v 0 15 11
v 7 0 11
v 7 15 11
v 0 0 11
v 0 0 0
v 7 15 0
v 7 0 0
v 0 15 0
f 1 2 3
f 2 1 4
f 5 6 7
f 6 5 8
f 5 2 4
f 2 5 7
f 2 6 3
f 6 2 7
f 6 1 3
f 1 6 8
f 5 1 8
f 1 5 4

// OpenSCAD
// Generated by SolidPython 1.0.1 on 2020-07-29 00:46:55


cube(size = [7, 15, 11]);
/***********************************************
*********      SolidPython code:      **********
************************************************
 
# import packages: SolidPython
from solid import *
from solid.utils import *
from itertools import chain, combinations, permutations


class Resize:

    def __init__(self, scad_file):
        self.scad_file = scad_file
        #self.scad_file = import_scad(scad_file)
        # cone/cylinder param:
        self.r1 = 0
        self.r2 = 0
        self.h = 0
        # rectangular prism param:
        self.w = 0
        self.l = 0
        # ellipse param:
        self.r = 0

    # import OpenScad code (file name corresponds to shape)


    # classify shape + parameters
    def assign(self, param1, param2, param3):
        if self.scad_file == 'cone.scad':
            self.r1 = param1
            self.r2 = param2
            self.h = param3
        elif self.scad_file == 'cylinder.scad':
            self.r1 = param1
            self.r2 = param2
            self.h = param3
        elif self.scad_file == 'rectangularPrism.scad':
            self.h = param1
            self.l = param2
            self.w = param3
        else:
            self.r = param1
            self.h = param2

    # resize parameters
    def iterate(self):
        x = range(3, 20, 2)
        i = 1
        if self.scad_file == 'cone.scad':
            tempList = list(permutations(x, 2))
            for temp in tempList:
                param1 = temp[0]
                param2 = temp[1]
                filepath = 'produced_scad_files/' + 'cone' + str(param1) + '_' + str(param2) + '_' + '.scad'
                scad_render_to_file(cylinder(h=param1, r1=param2, r2=0), filepath)

        elif self.scad_file == 'cylinder.scad':
            tempList = list(permutations(x, 3))
            for temp in tempList:
                param1 = temp[0]
                param2 = temp[1]
                filepath = 'produced_scad_files/' + 'cylinder' + str(param1) + '_' + str(param2) + '_' + '.scad'
                scad_render_to_file(cylinder(h=param1, r1=param2, r2=param2), filepath)

        elif self.scad_file == 'rectangularPrism.scad':
            tempList = list(permutations(x, 3))
            for temp in tempList:
                param1 = temp[0]
                param2 = temp[1]
                param3 = temp[2]
                filepath = 'produced_scad_files/' + 'rectangularPrism' + str(param1) + '_' + str(param2) + '_' + str(
                    param3) + '.scad'
                scad_render_to_file(cube(size=(param1, param2, param3)), filepath)

        elif self.scad_file == 'ellipse.scad':
            tempList = list(permutations(x, 4))
            for temp in tempList:
                param1 = temp[0]
                param2 = temp[1]
                param3 = temp[2]
                param4 = temp[3]
                filepath = 'produced_scad_files/' + 'ellipse' + str(param1) + '_' + str(param2) + '_' + str(param3) + '_' + str(param4) + '.scad'
                scad_render_to_file(scale([param1, param2, param3])(sphere(r=param4)), filepath)

    def render_to_scadfile(self):
        scad_render_to_file(scad, 'example.scad') 
 
************************************************/
